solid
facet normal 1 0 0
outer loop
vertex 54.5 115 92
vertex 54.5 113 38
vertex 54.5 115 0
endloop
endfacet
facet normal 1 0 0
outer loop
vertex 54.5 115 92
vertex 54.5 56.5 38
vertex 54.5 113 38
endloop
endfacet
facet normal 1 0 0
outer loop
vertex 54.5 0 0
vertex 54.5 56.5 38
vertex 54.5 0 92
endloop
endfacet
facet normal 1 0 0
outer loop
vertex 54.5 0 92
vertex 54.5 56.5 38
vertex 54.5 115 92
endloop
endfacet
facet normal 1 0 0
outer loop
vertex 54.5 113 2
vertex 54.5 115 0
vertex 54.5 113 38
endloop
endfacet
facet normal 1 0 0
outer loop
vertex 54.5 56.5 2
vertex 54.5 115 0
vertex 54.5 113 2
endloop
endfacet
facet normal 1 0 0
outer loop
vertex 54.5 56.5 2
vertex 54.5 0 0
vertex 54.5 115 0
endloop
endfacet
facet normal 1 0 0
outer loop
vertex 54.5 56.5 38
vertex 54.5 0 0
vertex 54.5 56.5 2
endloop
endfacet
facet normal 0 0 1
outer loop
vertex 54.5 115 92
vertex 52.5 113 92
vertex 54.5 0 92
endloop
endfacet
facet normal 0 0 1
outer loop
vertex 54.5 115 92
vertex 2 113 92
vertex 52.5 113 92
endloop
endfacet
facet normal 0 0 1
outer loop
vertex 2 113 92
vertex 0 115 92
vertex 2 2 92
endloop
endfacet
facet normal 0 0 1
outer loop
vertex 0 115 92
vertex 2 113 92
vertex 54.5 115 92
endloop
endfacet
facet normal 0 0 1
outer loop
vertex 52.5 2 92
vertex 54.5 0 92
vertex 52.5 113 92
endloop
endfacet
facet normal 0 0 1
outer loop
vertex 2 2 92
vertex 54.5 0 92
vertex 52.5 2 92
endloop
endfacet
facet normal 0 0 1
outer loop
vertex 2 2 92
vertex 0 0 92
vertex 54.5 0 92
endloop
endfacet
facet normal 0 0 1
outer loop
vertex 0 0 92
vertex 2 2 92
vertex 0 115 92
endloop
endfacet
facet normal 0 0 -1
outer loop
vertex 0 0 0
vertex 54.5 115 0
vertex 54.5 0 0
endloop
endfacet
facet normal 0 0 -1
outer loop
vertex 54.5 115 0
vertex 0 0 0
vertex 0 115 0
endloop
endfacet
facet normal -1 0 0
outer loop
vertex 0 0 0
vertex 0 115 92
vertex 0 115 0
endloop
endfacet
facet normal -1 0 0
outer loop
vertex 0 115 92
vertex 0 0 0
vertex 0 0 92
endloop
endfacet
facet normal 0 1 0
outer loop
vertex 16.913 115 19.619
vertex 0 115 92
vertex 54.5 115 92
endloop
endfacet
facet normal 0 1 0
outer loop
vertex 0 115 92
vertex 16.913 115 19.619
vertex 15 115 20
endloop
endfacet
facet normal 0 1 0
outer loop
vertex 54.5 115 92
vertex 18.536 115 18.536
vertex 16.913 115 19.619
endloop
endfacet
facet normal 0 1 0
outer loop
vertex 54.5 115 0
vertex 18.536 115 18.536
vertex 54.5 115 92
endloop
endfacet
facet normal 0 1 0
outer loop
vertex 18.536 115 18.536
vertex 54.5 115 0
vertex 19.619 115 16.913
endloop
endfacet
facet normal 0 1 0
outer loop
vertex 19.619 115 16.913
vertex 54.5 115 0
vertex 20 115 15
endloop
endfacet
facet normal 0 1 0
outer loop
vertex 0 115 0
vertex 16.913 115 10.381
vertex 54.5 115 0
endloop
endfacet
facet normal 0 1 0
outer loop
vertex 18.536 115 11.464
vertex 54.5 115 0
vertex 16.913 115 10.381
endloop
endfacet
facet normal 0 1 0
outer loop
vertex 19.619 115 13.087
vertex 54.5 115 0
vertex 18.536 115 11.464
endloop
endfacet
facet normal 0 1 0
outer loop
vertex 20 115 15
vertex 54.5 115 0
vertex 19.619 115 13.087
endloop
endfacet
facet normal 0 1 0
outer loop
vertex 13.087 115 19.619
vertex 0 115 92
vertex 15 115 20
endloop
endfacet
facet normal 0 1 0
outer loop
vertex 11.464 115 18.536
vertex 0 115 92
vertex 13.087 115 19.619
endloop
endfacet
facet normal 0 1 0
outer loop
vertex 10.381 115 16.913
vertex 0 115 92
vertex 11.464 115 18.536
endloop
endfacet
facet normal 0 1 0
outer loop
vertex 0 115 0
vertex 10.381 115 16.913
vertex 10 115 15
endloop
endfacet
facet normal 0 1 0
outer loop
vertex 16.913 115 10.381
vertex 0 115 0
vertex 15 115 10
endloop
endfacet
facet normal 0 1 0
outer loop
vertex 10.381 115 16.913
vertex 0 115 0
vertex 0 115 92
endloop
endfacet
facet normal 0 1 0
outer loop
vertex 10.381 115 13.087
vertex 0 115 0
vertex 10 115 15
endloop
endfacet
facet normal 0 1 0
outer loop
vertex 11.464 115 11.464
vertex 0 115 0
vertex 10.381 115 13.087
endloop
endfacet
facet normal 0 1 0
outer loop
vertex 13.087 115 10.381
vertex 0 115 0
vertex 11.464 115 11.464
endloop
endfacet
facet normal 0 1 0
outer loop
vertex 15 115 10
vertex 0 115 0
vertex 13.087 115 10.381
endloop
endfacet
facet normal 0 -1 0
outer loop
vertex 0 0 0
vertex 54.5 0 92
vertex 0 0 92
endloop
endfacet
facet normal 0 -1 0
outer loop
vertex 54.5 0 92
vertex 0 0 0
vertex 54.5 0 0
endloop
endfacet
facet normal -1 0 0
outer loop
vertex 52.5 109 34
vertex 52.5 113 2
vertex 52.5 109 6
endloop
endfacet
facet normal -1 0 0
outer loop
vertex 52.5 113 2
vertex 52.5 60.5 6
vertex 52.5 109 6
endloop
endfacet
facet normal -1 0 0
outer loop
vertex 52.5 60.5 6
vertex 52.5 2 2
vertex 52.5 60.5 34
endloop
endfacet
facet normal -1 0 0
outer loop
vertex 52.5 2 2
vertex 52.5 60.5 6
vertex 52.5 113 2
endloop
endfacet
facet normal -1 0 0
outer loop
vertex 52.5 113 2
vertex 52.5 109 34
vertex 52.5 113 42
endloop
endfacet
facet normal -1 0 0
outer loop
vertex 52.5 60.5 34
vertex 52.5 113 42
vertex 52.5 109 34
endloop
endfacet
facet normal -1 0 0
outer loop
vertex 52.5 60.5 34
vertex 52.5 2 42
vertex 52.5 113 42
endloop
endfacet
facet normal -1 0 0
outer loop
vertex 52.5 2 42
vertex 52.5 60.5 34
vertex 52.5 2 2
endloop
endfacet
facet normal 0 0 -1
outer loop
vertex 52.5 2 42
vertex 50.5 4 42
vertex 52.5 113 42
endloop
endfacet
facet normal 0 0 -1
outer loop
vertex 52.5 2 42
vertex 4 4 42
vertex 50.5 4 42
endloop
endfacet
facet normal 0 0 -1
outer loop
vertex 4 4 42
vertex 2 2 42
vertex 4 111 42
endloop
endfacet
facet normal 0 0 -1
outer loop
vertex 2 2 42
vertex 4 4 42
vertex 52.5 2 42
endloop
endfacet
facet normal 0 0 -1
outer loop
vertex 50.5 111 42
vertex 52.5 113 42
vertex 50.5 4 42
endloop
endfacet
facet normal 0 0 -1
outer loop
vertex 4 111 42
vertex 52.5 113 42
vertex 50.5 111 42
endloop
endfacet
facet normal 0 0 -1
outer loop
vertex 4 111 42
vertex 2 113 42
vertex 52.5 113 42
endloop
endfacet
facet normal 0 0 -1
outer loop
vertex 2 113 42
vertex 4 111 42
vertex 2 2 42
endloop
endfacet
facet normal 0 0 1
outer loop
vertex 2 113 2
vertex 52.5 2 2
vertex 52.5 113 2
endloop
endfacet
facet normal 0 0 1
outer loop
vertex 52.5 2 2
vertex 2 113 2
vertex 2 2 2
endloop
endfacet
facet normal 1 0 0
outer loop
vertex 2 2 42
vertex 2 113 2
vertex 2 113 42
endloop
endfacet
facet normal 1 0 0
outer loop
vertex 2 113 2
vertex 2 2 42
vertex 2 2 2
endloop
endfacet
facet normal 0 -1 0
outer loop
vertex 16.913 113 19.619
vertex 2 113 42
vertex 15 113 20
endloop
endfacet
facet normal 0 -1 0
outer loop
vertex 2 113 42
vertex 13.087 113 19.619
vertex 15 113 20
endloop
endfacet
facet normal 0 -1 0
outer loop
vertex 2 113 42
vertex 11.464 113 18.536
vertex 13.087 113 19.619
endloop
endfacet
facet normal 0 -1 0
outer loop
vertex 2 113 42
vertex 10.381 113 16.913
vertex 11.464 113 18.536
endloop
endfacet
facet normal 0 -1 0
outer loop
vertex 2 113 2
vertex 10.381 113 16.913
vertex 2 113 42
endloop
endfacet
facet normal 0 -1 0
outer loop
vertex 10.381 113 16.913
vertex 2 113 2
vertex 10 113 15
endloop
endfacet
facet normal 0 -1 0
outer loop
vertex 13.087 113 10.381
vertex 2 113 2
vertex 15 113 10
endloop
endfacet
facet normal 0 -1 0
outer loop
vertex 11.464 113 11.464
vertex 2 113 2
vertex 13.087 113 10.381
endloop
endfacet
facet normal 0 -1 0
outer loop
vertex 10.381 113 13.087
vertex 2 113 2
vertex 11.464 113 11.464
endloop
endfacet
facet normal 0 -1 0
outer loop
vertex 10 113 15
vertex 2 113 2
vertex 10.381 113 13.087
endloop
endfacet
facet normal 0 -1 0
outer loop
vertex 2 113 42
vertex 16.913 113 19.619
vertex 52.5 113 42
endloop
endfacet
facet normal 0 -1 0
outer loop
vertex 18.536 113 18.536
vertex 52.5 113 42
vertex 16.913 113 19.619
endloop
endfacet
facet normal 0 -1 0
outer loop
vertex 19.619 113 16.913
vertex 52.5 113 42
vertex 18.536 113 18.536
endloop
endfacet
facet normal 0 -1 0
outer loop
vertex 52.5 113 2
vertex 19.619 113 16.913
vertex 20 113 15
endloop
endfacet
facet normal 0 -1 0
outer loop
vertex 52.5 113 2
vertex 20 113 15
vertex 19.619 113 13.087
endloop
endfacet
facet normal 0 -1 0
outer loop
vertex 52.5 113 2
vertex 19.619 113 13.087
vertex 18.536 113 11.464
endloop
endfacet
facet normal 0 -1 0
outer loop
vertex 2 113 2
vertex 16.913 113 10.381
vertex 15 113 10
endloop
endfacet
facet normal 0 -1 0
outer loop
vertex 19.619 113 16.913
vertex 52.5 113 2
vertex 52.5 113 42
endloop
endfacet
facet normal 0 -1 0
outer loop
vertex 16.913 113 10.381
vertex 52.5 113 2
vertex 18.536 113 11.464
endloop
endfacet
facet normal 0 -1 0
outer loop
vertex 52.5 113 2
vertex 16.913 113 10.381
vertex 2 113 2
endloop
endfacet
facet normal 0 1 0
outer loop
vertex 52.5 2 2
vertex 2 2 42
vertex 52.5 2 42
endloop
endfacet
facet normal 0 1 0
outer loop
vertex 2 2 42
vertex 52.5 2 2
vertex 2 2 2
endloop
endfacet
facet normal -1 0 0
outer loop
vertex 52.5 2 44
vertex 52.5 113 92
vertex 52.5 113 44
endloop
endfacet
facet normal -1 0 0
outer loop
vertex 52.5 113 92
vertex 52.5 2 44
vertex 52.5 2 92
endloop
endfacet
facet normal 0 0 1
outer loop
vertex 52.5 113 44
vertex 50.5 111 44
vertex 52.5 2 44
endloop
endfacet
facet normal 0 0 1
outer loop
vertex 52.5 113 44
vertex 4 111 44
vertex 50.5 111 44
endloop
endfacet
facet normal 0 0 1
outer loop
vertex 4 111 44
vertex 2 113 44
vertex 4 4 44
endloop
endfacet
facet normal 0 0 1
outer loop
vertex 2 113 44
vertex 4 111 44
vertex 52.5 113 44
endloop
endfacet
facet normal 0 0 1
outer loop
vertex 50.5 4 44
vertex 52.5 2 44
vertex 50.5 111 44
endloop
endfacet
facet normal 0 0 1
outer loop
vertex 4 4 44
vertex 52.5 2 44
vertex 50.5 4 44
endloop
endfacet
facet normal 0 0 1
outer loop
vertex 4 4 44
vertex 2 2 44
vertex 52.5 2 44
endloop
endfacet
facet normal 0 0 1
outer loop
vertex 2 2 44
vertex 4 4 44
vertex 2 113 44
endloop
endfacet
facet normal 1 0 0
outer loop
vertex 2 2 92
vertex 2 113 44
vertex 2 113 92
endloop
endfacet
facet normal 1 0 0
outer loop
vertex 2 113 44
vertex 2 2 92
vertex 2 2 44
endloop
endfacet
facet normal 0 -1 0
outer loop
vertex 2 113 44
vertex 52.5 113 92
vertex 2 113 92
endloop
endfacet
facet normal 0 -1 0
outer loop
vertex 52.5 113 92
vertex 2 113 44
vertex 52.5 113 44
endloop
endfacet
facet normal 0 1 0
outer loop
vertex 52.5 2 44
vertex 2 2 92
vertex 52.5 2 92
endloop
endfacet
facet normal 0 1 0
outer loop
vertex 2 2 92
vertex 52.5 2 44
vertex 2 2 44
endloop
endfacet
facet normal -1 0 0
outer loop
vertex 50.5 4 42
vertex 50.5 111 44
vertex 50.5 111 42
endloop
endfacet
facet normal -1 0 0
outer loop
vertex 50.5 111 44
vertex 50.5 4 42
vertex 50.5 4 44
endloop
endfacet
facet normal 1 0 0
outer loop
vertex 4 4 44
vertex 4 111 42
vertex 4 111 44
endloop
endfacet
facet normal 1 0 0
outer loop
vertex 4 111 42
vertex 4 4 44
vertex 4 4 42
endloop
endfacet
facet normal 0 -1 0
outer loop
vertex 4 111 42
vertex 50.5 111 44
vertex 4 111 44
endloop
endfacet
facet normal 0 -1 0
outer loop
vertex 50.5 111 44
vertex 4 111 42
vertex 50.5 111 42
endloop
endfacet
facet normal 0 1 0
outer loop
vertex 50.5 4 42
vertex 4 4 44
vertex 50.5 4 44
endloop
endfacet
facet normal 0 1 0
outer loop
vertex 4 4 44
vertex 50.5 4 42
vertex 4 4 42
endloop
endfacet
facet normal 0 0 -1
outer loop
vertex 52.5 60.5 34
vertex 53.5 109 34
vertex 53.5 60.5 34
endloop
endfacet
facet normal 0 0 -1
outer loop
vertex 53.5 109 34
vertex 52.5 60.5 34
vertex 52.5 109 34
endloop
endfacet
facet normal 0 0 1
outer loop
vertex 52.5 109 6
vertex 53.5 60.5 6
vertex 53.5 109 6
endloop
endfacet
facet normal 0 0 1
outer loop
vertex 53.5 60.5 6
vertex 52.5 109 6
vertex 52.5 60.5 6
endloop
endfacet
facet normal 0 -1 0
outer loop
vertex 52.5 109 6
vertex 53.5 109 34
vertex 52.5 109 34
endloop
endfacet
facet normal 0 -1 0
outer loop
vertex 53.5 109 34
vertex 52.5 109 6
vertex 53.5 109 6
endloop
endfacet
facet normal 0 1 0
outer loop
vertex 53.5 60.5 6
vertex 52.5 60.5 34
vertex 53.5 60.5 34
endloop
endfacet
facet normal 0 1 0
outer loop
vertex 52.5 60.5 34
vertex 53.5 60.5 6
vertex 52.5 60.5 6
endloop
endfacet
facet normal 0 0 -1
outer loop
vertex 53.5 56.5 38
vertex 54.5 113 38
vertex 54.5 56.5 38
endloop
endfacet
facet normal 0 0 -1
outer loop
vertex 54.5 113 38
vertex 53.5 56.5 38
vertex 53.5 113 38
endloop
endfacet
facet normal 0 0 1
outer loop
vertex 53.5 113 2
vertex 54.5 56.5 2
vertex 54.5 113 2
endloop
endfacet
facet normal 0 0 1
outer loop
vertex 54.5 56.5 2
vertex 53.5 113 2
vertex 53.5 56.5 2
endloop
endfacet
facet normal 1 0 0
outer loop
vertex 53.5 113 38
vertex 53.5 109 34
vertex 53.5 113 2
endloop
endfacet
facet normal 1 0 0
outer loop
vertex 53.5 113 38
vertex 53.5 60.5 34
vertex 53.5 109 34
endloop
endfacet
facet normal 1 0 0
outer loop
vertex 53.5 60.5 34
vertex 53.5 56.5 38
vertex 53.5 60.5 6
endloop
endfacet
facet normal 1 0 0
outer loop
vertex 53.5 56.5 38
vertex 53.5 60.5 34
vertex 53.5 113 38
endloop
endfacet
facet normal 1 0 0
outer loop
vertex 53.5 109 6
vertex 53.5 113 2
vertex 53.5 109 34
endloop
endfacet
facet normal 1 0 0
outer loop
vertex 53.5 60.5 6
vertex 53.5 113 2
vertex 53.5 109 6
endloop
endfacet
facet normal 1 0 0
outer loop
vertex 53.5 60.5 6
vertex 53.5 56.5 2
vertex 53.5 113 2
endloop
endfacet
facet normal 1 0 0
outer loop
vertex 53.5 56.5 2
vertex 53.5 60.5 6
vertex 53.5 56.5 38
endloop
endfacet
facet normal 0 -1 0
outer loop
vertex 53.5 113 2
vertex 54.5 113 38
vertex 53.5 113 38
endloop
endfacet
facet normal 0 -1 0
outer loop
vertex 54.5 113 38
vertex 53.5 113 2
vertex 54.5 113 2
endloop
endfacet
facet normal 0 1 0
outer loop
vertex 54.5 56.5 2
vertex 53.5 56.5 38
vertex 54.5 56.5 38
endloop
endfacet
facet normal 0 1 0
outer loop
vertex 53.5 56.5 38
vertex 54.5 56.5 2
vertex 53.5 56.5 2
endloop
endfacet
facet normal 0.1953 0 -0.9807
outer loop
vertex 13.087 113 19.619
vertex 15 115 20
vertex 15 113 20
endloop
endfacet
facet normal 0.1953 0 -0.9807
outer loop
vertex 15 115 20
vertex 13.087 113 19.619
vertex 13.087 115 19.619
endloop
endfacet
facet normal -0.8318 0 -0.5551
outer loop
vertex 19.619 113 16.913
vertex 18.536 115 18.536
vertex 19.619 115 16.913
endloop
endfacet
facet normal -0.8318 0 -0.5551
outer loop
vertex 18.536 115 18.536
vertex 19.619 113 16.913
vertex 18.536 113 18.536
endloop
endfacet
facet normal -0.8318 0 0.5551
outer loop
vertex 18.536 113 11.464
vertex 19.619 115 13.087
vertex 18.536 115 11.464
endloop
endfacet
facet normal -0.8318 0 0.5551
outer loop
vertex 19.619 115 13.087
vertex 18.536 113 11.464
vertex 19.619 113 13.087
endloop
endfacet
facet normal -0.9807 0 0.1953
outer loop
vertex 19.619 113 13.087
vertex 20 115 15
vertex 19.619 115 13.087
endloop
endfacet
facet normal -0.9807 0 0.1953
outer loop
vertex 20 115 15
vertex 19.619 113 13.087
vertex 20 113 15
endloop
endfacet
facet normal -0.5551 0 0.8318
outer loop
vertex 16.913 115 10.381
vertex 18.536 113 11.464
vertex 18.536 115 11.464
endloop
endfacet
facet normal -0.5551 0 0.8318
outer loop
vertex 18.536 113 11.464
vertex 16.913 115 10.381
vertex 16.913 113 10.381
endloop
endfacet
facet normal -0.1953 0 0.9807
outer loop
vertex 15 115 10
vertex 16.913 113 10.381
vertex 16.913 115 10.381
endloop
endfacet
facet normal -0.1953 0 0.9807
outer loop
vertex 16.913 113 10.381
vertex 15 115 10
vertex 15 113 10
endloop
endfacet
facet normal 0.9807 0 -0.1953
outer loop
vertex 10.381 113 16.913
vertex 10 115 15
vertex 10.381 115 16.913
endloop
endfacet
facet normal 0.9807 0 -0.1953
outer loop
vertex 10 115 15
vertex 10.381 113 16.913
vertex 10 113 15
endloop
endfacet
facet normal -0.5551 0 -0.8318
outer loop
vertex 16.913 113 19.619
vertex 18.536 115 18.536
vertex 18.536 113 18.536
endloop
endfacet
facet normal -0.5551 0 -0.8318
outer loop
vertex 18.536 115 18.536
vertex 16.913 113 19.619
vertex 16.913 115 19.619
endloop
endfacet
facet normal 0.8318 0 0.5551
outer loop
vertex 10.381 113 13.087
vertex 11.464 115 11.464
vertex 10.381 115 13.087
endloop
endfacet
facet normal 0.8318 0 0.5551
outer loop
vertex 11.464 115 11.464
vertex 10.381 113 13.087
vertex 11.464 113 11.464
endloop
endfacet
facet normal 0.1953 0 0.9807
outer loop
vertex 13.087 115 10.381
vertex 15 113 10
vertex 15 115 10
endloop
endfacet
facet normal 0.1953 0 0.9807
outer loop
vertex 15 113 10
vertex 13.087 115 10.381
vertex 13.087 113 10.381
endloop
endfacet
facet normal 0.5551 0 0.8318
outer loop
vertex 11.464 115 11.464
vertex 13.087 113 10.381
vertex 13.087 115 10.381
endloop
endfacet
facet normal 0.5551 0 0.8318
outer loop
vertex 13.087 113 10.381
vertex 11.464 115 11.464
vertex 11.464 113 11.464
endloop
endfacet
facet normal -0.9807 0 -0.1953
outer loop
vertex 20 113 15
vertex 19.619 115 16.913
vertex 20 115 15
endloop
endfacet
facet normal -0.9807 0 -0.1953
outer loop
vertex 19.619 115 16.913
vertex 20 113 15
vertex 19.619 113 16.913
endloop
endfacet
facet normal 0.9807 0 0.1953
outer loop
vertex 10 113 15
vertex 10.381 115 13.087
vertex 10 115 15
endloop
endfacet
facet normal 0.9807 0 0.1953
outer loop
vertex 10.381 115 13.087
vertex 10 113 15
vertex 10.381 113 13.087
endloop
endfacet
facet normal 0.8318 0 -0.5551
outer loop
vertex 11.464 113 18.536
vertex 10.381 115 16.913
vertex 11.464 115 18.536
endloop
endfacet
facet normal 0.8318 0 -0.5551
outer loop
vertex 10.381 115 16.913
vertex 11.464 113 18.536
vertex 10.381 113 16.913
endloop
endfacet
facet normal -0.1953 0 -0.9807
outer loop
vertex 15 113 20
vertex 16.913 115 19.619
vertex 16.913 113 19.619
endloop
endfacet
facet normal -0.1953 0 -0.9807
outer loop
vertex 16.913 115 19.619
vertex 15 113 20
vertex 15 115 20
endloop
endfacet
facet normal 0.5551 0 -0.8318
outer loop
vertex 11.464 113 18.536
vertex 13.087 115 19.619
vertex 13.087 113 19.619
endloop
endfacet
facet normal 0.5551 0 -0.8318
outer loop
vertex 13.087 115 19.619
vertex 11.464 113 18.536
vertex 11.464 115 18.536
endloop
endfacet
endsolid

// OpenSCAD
thickness = 2;
thickness_half = thickness / 2;

width_inner = 50.5;
depth_inner = 111;
height_inner = 90;

width_outer = width_inner + thickness + thickness;
depth_outer = depth_inner + thickness + thickness;
height_outer = height_inner + thickness;

inner_rim_at = 40;

switch_cutout_height_offset = 6;
switch_cutout_depth_offset = 60.5;
switch_cutout_height = 28;
switch_cutout_depth = 48.5;
switch_cutout_rim = 4;

difference()
{
    // Outer box.
    cube([width_outer, depth_outer, height_outer]);
    
    // Make hollow, lower-part.
    translate([thickness, thickness, thickness])
    {
        cube([width_inner, depth_inner, inner_rim_at]);
    }
    
    // Make hollow, lower-part.
    translate([thickness, thickness, thickness + inner_rim_at + thickness])
    {
        cube([width_inner, depth_inner, 80]);
    }
    
    // Inner cable opening.
    translate([thickness + thickness, thickness + thickness, thickness])
    {
        cube([width_inner - thickness - thickness, depth_inner - thickness - thickness, height_inner]);
    }
    
    // Switch cut-out.
    translate([thickness + width_inner, switch_cutout_depth_offset, switch_cutout_height_offset])
    {
        cube([thickness, switch_cutout_depth, switch_cutout_height]);
    }

    // Switch cut-out rim.
    translate([thickness + width_inner + thickness - thickness_half, switch_cutout_depth_offset - switch_cutout_rim, switch_cutout_height_offset - switch_cutout_rim])
    {
        cube([thickness_half, switch_cutout_rim + switch_cutout_depth + switch_cutout_rim, switch_cutout_rim + switch_cutout_height + switch_cutout_rim]);
    }   
    
    // Cable-opening back.
    translate([15, depth_outer - thickness, 15])
    {
        rotate(a = 270, v = [1, 0, 0])
        {
            cylinder(h = 80, r = 5, center = true);
        }
    }
    
    
}
